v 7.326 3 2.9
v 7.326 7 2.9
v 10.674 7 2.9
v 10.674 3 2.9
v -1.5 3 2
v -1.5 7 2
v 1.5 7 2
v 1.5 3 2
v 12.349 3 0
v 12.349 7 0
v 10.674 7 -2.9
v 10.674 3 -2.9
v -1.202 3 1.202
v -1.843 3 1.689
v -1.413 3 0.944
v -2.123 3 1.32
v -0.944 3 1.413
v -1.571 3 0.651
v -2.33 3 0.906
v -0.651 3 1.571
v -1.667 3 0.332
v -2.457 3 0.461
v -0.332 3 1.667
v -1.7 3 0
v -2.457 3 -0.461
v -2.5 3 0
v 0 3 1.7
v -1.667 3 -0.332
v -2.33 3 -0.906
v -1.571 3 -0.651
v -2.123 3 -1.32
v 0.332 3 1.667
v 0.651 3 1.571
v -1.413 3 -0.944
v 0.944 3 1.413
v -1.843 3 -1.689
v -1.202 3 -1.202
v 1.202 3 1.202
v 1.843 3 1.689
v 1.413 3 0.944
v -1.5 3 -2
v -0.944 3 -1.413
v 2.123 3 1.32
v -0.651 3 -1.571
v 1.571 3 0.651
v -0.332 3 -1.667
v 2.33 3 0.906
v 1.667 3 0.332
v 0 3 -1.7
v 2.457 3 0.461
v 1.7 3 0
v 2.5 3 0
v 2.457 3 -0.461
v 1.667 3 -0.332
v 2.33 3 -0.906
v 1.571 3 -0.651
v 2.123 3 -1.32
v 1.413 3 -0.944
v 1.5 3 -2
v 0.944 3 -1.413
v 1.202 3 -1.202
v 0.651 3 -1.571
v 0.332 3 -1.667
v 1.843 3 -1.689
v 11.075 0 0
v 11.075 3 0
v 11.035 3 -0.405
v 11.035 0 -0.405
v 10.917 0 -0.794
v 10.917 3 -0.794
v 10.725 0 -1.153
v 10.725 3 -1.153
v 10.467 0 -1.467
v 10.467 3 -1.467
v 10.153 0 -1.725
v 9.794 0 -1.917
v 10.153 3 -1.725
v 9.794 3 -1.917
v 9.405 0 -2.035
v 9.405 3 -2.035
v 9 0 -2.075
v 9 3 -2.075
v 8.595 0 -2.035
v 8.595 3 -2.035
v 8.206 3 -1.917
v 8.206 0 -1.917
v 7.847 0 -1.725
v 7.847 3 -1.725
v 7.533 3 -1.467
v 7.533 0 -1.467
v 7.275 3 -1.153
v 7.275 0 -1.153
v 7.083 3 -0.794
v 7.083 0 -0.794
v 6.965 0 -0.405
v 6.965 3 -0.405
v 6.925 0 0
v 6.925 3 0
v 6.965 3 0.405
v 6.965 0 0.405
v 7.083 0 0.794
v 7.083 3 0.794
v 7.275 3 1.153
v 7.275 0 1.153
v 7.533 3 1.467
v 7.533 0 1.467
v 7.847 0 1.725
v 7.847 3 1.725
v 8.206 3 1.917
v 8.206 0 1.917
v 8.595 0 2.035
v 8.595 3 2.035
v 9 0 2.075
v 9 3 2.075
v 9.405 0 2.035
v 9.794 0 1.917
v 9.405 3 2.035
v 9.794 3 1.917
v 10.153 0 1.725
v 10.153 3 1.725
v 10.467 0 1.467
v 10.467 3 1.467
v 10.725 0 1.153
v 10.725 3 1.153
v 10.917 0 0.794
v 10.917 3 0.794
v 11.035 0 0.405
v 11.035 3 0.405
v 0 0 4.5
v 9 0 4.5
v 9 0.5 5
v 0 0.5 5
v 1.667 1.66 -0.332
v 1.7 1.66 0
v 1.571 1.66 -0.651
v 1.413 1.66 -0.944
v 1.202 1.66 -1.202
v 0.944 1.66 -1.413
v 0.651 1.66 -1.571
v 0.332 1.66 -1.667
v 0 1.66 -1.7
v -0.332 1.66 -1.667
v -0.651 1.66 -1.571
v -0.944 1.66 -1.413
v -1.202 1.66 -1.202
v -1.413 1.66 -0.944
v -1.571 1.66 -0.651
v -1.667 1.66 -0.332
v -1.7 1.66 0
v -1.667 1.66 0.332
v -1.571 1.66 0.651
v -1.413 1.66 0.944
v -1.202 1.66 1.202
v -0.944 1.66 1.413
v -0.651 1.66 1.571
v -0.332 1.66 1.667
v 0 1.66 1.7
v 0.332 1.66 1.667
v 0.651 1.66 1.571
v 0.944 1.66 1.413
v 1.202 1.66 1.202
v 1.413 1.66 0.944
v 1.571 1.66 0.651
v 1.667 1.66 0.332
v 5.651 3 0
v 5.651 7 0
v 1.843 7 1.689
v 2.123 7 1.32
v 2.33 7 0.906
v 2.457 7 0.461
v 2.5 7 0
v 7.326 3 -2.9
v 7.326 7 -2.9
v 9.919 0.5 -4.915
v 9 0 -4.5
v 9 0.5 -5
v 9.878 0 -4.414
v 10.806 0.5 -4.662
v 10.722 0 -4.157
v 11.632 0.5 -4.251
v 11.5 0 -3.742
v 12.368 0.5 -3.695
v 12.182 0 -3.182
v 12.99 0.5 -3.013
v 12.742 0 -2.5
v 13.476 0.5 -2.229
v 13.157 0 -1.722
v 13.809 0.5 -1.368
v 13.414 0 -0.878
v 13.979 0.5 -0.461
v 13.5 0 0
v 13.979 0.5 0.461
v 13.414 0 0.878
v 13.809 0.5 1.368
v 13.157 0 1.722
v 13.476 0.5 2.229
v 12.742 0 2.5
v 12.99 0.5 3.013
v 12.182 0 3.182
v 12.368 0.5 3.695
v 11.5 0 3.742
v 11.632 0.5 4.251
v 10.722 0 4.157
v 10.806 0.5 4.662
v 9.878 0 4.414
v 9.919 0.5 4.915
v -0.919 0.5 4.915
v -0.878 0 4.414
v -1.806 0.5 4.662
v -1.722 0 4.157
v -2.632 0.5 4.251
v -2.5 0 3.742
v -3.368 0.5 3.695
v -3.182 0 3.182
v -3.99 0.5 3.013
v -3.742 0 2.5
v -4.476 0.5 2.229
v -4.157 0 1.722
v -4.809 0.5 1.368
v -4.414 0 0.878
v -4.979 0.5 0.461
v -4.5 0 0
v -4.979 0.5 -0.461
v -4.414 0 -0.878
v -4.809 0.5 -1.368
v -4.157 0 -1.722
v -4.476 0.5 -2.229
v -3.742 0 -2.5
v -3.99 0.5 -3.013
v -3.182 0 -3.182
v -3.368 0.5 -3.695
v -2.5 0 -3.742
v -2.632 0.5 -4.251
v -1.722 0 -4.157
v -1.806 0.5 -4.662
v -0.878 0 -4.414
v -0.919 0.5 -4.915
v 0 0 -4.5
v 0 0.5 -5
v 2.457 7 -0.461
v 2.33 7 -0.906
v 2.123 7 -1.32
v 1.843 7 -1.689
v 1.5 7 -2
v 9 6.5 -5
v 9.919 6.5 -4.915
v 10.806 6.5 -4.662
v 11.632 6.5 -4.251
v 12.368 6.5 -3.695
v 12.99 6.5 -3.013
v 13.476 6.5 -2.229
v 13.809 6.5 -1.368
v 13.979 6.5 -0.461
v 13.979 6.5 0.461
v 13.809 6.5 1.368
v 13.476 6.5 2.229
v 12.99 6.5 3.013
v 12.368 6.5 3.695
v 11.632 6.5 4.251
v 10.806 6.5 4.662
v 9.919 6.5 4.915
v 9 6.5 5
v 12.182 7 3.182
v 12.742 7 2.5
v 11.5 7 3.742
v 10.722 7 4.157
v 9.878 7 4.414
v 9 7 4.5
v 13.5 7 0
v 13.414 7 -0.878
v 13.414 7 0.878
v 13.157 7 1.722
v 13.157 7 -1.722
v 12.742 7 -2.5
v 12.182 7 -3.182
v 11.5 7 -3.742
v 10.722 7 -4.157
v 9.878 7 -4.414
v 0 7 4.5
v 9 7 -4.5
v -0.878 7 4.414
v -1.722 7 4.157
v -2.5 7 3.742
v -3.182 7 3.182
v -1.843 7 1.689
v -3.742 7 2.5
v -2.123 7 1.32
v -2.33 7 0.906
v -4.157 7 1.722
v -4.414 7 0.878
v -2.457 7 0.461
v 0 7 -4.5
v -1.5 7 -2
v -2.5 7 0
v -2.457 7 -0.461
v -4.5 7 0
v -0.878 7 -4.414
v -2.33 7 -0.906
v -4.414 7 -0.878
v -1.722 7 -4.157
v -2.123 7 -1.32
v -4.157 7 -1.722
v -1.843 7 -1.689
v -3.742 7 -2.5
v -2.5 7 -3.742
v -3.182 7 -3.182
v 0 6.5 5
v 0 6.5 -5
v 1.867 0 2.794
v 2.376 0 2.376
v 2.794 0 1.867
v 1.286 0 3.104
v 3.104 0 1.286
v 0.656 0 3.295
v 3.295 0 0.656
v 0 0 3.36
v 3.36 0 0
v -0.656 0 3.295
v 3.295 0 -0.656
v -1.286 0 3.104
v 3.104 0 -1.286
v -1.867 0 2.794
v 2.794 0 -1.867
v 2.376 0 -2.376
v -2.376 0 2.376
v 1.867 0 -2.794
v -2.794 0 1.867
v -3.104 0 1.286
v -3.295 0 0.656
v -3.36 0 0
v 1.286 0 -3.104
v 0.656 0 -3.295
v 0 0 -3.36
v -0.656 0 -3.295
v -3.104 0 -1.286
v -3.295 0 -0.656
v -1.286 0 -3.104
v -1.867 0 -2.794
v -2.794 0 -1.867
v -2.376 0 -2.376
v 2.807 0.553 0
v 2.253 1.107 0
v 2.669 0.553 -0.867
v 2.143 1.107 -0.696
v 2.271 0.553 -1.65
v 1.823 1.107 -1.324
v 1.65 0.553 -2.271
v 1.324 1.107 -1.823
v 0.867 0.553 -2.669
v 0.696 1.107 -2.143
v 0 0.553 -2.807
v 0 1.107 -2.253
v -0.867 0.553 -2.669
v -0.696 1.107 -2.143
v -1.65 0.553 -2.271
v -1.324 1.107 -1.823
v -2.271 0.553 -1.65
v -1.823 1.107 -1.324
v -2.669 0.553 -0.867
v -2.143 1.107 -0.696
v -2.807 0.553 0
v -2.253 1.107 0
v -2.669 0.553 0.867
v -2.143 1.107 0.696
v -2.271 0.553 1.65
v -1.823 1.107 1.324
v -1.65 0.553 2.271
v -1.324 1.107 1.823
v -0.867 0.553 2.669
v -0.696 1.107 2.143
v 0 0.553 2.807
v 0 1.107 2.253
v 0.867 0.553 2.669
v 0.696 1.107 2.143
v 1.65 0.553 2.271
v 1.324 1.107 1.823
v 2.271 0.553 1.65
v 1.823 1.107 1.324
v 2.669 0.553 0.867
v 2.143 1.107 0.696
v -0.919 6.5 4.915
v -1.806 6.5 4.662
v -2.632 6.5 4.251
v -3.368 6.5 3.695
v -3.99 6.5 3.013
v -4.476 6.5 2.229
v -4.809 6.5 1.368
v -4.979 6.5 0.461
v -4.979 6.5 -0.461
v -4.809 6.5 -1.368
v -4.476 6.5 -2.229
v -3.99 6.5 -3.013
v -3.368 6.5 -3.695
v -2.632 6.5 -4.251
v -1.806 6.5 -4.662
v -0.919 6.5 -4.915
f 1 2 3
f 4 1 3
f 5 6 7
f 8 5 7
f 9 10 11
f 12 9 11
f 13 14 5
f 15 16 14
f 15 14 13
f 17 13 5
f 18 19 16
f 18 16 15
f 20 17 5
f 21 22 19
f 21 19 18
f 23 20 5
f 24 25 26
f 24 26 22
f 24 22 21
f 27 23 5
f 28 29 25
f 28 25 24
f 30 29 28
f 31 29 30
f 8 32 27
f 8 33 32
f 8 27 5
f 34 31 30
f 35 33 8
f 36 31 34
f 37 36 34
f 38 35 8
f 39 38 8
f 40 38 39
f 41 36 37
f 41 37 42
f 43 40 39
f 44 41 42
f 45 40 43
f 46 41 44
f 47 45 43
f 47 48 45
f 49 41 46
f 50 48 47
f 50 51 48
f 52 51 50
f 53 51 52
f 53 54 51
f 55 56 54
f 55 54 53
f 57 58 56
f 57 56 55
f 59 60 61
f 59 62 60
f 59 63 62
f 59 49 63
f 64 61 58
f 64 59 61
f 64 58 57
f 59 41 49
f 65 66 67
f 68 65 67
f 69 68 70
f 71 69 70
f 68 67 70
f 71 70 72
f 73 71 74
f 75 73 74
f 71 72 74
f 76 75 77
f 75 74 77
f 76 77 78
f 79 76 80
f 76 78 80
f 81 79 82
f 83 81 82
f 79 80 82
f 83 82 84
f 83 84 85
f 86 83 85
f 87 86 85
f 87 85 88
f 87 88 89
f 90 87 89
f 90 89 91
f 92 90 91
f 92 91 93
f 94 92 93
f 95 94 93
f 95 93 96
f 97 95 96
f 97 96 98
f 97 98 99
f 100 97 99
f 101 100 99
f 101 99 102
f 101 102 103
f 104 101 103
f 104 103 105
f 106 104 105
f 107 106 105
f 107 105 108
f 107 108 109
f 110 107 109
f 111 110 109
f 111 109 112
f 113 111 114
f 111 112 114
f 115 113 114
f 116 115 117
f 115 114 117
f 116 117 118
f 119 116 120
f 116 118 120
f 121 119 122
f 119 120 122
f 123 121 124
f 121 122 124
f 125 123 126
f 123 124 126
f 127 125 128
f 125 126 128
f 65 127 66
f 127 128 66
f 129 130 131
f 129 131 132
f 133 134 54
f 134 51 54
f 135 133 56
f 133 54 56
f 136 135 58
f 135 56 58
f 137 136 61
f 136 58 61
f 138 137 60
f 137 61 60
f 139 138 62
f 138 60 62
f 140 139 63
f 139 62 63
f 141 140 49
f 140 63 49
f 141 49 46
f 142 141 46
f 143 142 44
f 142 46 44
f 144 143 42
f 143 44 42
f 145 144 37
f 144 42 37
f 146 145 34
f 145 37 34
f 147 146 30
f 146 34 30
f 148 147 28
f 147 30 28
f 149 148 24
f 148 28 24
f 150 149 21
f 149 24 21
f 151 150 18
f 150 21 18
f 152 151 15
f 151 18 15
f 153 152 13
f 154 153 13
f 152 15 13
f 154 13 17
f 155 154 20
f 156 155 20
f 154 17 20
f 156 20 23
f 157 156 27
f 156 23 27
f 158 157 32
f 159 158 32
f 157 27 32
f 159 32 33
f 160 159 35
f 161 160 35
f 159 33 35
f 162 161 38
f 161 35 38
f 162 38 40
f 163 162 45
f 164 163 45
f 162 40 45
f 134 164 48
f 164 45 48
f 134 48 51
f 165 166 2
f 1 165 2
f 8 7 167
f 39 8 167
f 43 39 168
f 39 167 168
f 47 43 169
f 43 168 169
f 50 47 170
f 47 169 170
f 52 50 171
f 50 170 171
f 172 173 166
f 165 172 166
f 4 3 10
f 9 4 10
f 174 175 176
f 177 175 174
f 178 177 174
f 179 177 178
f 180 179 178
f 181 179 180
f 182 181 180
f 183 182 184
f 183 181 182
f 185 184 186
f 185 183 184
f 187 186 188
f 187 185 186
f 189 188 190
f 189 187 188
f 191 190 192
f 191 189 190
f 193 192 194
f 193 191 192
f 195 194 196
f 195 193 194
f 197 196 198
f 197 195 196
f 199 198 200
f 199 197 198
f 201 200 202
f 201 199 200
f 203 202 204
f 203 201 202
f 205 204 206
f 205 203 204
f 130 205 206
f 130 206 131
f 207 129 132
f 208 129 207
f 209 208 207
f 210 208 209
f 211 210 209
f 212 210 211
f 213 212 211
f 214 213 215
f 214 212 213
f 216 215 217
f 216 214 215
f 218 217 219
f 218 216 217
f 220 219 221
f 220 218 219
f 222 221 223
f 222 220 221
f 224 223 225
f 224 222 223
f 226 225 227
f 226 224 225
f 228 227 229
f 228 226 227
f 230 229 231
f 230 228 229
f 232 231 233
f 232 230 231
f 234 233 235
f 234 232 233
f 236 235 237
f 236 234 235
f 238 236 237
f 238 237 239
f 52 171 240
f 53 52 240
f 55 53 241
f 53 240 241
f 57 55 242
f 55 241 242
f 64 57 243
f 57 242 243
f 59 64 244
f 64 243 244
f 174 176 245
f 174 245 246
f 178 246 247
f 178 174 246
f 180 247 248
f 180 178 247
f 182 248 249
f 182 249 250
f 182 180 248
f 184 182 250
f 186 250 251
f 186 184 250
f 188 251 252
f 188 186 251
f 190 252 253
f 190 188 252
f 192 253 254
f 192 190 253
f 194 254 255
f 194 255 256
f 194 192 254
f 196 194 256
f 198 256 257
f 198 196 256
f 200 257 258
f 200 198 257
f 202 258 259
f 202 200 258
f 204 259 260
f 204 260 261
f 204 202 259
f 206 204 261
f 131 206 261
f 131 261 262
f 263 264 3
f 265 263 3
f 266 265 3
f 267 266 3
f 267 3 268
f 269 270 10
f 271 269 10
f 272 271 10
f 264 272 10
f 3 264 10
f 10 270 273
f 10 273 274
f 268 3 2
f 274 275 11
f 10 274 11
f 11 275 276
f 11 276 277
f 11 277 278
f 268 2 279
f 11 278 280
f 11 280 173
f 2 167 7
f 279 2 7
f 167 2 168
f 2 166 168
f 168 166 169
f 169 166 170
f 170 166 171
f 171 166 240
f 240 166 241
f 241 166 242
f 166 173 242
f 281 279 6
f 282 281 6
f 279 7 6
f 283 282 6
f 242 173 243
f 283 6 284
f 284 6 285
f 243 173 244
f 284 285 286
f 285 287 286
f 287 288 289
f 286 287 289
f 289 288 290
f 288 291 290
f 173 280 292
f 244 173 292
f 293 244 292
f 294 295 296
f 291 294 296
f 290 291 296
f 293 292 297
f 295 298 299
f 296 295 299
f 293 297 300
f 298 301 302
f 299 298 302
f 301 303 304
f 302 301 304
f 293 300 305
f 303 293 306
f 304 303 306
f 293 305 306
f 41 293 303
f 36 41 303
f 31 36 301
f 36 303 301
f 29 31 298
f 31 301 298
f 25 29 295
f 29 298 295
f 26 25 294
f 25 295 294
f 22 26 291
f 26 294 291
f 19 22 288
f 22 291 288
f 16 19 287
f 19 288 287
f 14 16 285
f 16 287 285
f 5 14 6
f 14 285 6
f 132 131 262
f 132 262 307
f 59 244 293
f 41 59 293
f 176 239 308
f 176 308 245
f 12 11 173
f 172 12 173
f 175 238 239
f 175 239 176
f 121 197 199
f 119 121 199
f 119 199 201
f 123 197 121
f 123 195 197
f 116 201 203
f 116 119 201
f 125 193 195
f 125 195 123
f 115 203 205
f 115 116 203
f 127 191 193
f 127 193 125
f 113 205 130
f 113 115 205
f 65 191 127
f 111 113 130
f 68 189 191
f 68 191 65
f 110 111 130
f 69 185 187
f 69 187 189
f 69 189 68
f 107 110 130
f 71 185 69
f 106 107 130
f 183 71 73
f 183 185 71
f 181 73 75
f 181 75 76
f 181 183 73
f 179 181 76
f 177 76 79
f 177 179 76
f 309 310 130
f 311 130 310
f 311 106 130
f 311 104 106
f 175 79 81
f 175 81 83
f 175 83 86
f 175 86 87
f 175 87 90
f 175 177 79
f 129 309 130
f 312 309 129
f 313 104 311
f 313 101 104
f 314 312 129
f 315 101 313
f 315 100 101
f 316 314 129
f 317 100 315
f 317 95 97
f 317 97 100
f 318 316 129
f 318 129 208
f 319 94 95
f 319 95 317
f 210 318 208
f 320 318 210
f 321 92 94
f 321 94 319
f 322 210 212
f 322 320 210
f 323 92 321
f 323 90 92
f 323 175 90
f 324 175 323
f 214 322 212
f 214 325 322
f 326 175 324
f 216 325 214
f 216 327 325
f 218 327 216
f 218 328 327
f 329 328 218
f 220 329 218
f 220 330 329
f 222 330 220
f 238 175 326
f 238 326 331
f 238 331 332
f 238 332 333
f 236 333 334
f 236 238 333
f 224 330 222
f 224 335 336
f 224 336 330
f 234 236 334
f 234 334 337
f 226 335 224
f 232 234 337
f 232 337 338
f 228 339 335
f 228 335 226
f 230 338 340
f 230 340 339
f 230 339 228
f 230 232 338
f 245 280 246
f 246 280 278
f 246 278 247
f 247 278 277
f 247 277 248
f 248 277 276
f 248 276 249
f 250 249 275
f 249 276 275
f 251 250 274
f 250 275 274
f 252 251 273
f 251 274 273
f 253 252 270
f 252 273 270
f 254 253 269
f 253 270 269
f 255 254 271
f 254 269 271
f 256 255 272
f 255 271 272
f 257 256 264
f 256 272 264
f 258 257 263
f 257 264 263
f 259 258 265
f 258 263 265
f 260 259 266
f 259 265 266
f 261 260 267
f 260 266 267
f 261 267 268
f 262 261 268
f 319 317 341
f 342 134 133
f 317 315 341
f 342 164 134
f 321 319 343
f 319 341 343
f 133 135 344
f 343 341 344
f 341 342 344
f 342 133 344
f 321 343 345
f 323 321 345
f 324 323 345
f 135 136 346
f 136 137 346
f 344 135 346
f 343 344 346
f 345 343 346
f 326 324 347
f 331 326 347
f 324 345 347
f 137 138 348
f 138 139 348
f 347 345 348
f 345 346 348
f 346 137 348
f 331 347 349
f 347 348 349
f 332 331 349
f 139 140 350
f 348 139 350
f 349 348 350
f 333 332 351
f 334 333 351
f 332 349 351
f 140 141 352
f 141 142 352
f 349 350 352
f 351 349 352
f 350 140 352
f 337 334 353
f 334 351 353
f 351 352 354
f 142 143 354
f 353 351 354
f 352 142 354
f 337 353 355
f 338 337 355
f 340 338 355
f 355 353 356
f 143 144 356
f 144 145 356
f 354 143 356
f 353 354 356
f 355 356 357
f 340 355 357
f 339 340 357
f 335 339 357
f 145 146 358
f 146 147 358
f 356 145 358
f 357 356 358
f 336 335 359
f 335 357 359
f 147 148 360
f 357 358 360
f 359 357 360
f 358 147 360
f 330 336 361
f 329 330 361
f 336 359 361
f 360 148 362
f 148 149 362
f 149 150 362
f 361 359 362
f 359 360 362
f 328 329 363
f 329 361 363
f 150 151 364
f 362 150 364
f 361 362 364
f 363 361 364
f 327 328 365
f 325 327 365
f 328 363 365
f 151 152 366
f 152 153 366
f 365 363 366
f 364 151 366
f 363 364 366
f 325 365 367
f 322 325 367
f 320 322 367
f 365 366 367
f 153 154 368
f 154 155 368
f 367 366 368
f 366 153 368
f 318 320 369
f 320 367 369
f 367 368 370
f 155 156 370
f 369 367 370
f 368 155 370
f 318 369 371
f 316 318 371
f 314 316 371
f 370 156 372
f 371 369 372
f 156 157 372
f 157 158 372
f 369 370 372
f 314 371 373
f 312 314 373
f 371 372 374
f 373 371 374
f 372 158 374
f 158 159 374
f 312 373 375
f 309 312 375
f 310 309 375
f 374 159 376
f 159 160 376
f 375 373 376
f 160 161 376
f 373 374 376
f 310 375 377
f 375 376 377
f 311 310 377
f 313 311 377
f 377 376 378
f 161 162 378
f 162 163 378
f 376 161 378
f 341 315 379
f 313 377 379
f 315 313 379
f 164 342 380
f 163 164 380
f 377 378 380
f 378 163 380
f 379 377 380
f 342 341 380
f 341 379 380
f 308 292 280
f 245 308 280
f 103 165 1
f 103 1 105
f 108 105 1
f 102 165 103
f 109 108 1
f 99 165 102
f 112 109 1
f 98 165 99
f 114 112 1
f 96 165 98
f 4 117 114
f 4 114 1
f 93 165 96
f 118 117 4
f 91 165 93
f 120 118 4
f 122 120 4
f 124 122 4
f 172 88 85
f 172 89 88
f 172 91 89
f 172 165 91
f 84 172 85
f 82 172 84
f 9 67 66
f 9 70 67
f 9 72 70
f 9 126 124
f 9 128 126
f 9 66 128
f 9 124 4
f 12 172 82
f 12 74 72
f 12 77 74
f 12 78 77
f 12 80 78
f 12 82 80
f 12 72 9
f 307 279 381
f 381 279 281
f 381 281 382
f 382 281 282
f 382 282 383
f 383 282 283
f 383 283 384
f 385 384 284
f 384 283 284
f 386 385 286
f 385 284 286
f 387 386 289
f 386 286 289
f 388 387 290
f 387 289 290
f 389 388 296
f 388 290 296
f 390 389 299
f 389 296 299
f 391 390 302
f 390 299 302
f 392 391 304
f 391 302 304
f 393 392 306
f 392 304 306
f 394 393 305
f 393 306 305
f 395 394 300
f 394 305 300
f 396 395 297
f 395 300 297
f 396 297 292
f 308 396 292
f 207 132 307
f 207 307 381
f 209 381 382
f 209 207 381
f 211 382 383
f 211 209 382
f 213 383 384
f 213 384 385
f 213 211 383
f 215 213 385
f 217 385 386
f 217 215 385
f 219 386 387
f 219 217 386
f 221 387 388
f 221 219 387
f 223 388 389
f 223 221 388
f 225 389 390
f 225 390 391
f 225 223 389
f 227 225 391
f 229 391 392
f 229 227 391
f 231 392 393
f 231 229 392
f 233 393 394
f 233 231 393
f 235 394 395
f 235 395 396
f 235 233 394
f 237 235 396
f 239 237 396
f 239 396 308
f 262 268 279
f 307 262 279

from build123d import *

# Parameters (mm, degrees)
EXTRUDE_1_DEPTH              = 7
CUT_EXTRUDE_1_DEPTH          = 4
HOLE_WIZARD_M3_1_D           = 3.4
HOLE_WIZARD_M3_1_DEPTH       = 7.5
HOLE_WIZARD_M3_1_CSINK_D     = 6.72
HOLE_WIZARD_M3_1_CSINK_ANGLE = 90
HOLE_WIZARD_M3_1_TIP         = 1.021463052
HOLE_WIZARD_1_D              = 4.15
CUT_EXTRUDE_2_DEPTH          = 4
CHAMFER_1_SIZE               = 0.5


with BuildPart() as part:
    # 草图1 → 凸台-拉伸1 (new body)
    with BuildSketch(Plane(origin=(0, 0, 0), x_dir=(1, 0, 0), z_dir=(0, 1, 0))):
        with BuildLine():
            Line((0, 5), (9, 5))
            ThreePointArc((9, 5), (14, 0), (9, -5))
            Line((9, -5), (0, -5))
            ThreePointArc((0, -5), (-5, 0), (0, 5))
        make_face()
    extrude(amount=EXTRUDE_1_DEPTH)

    # 草图2 → 切除-拉伸1 (cut)
    with BuildSketch(Plane(origin=(0, 7, 0), x_dir=(1, 0, 0), z_dir=(0, 1, 0))):
        with BuildLine():
            ThreePointArc((-1.5, 2), (-2.5, 0), (-1.5, -2))
            Line((-1.5, -2), (1.5, -2))
            ThreePointArc((1.5, -2), (2.236067977, -1.118033989), (2.5, 0))
            ThreePointArc((2.5, 0), (2.236067977, 1.118033989), (1.5, 2))
            Line((1.5, 2), (-1.5, 2))
        make_face()
    extrude(amount=-CUT_EXTRUDE_1_DEPTH, mode=Mode.SUBTRACT)

    # M3 六角凹锥坑螺钉的锥形沉头孔1
    with Locations(Plane(origin=(0, 0, 0), x_dir=(-1, 0, 0), z_dir=(0, -1, 0))):
        with Locations((0, 0)):
            CounterSinkHole(HOLE_WIZARD_M3_1_D / 2, HOLE_WIZARD_M3_1_CSINK_D / 2, depth=HOLE_WIZARD_M3_1_DEPTH, counter_sink_angle=HOLE_WIZARD_M3_1_CSINK_ANGLE)
            with Locations((0, 0, -(HOLE_WIZARD_M3_1_DEPTH + HOLE_WIZARD_M3_1_TIP / 2))):  # 118° drill point
                Cone(0, HOLE_WIZARD_M3_1_D / 2, HOLE_WIZARD_M3_1_TIP, mode=Mode.SUBTRACT)

    # 孔1 (through all)
    with Locations(Plane(origin=(0, 0, 0), x_dir=(-1, 0, 0), z_dir=(0, -1, 0))):
        with Locations((-9, 0)):
            Hole(HOLE_WIZARD_1_D / 2)

    # 草图7 → 切除-拉伸2 (cut)
    with BuildSketch(Plane(origin=(0, 7, 0), x_dir=(1, 0, 0), z_dir=(0, 1, 0))):
        Polygon((12.348631561, 0), (10.674315781, 2.9), (7.325684219, 2.9), (5.651368439, 0), (7.325684219, -2.9), (10.674315781, -2.9), align=None)
    extrude(amount=-CUT_EXTRUDE_2_DEPTH, mode=Mode.SUBTRACT)

    # 倒角1
    chamfer_1_edges = [part.edges().sort_by_distance(p)[0] for p in [
        (14, 7, 0),
        (4.5, 7, -5),
        (-5, 7, 0),
        (4.5, 0, -5),
        (14, 0, 0),
        (4.5, 0, 5),
        (-5, 0, 0),
        (4.5, 7, 5),
    ]]
    chamfer(chamfer_1_edges, length=CHAMFER_1_SIZE)


solid = part.part
